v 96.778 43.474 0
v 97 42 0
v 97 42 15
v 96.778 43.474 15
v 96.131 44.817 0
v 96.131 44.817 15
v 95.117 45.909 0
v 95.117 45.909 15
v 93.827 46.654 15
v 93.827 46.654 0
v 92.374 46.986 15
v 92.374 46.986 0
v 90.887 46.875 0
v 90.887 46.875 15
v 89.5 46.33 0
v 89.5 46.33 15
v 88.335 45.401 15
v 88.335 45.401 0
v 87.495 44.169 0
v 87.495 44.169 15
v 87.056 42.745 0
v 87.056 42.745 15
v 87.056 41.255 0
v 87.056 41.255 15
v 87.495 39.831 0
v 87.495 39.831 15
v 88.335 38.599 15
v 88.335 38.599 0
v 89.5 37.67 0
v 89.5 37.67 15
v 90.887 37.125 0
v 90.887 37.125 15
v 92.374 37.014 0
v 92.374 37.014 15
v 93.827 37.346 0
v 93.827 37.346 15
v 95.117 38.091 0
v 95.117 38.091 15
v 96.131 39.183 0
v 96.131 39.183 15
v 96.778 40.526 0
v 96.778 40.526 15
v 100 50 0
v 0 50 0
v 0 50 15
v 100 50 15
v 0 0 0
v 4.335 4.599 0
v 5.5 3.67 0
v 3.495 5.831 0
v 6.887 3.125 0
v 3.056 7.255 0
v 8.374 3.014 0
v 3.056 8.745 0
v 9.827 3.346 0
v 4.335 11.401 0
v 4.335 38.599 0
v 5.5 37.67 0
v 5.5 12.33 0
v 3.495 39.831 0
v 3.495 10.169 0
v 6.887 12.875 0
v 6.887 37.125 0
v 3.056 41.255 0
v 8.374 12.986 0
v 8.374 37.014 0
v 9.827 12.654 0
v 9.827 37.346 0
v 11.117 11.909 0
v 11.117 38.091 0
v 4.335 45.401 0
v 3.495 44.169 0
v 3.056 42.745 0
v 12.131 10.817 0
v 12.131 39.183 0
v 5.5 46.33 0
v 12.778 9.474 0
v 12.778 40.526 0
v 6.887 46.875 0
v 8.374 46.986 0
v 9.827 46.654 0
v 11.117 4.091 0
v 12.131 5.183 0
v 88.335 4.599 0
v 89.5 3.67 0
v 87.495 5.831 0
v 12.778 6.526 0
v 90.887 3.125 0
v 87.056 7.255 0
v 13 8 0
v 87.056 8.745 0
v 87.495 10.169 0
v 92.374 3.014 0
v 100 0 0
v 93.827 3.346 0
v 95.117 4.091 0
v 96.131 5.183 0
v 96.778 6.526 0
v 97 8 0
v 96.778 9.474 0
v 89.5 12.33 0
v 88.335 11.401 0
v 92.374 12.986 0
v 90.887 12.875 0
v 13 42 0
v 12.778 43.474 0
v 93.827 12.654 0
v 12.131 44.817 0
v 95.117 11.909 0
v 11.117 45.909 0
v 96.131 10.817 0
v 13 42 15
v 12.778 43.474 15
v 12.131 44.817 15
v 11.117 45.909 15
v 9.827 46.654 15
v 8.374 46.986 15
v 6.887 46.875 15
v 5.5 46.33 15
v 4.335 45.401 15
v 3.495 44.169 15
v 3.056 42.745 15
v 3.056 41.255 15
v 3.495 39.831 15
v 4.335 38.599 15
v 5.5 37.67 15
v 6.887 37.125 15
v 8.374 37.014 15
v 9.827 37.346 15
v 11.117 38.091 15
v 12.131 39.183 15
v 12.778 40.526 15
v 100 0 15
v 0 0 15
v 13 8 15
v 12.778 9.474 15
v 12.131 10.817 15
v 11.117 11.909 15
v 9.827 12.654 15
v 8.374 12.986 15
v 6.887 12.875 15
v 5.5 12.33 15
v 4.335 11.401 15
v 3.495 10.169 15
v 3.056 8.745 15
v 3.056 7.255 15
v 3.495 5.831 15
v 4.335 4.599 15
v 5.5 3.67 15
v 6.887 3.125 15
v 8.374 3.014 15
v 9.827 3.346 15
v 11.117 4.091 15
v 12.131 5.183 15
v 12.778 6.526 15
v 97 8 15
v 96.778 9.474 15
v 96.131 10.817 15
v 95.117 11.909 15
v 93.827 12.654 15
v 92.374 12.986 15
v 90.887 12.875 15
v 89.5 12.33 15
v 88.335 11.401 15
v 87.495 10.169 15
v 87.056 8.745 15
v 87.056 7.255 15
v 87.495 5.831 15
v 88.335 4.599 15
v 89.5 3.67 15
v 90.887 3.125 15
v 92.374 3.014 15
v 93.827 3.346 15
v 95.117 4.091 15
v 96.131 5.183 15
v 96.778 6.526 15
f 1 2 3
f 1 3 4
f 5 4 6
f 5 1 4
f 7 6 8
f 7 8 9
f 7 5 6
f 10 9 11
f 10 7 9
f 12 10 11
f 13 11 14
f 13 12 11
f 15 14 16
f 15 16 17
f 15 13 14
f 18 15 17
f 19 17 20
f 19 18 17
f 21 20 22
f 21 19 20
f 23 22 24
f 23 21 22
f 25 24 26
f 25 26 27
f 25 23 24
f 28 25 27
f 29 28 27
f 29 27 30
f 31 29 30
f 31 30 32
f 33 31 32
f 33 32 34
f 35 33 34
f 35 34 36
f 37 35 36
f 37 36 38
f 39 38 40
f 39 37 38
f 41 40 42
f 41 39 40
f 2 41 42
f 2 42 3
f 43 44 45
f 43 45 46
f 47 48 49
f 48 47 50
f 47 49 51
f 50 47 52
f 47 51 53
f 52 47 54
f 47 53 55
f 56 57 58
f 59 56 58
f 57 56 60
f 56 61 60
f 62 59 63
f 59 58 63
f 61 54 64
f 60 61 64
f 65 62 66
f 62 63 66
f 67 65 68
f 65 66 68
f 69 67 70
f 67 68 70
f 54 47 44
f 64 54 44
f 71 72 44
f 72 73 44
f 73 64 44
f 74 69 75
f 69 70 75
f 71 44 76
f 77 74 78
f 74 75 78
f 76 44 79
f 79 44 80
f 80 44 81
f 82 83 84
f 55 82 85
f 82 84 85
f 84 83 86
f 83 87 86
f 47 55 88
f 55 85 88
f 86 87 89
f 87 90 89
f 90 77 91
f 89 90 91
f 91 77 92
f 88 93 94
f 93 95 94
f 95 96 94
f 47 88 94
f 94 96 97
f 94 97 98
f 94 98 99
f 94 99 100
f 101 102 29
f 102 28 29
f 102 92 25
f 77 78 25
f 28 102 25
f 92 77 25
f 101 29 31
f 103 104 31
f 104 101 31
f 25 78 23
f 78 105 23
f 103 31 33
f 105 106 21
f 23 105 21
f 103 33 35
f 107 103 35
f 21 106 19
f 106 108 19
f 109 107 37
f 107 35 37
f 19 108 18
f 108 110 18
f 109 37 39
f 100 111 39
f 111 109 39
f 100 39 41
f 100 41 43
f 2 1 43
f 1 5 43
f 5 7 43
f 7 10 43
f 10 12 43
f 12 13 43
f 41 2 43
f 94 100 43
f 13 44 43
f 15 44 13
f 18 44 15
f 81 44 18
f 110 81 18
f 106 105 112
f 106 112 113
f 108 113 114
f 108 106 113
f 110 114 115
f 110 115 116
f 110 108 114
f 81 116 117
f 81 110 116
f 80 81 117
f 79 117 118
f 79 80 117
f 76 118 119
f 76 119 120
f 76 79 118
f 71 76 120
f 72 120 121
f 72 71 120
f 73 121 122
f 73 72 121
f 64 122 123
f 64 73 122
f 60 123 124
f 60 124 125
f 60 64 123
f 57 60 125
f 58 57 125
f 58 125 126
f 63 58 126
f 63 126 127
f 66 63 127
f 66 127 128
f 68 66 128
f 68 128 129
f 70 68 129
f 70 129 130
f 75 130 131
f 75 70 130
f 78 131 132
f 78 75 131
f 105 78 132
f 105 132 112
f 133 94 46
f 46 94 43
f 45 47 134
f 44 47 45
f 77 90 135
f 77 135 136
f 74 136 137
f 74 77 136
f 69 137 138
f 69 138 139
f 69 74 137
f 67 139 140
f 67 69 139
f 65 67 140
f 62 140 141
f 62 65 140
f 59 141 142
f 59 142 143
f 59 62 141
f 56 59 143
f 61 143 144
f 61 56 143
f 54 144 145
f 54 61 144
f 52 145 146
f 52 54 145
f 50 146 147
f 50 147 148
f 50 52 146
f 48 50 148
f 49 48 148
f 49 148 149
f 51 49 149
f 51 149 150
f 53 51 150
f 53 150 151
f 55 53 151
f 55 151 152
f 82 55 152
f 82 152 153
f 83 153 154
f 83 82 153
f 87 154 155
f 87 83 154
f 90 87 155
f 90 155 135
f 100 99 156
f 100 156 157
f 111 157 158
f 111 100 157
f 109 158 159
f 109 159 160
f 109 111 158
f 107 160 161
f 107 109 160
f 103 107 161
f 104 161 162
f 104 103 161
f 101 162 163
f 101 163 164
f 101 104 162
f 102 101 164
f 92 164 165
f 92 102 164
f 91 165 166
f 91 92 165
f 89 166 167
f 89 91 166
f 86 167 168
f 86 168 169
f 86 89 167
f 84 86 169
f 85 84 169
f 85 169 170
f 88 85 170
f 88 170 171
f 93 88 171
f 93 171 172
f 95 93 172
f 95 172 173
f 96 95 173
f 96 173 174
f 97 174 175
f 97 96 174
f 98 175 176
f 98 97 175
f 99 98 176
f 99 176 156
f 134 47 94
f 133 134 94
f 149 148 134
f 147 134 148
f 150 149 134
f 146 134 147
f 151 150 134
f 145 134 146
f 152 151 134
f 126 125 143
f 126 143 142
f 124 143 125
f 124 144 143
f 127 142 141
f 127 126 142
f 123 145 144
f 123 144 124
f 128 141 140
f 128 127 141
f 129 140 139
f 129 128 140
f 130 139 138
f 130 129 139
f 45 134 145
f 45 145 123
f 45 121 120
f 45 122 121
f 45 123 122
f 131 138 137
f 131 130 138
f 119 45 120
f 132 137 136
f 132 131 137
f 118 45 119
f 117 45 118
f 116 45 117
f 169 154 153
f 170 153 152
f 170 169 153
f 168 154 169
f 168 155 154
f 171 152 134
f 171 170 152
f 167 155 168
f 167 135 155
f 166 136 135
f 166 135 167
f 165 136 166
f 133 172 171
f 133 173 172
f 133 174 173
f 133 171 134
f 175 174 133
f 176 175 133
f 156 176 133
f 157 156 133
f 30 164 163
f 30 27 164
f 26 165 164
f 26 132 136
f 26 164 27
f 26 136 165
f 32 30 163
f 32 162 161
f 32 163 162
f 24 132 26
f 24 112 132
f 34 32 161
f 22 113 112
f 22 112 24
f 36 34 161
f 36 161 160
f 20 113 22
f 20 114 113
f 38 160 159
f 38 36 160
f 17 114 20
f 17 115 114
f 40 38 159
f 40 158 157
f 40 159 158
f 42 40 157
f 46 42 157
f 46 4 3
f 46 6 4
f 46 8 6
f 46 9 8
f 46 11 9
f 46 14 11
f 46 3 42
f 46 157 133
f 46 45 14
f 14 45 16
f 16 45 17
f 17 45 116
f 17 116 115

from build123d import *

# Parameters (mm, degrees)
SKETCH001_W  = 100
SKETCH001_H  = 50
SKETCH001_R  = 5
PAD_DEPTH    = 15
PAD001_DEPTH = 15


with BuildPart() as part:
    # Sketch001 → Pad (new body)
    with BuildSketch(Plane.XY):
        with Locations((50, 25)):
            Rectangle(SKETCH001_W, SKETCH001_H)
        with Locations((92, 42)):
            Circle(SKETCH001_R, mode=Mode.SUBTRACT)
        with Locations((8, 42)):
            Circle(SKETCH001_R, mode=Mode.SUBTRACT)
        with Locations((92, 8)):
            Circle(SKETCH001_R, mode=Mode.SUBTRACT)
        with Locations((8, 8)):
            Circle(SKETCH001_R, mode=Mode.SUBTRACT)
    extrude(amount=PAD_DEPTH)

    # Sketch001 → Pad001 (join)
    with BuildSketch(Plane.XY):
        with Locations((50, 25)):
            Rectangle(SKETCH001_W, SKETCH001_H)
        with Locations((92, 42)):
            Circle(SKETCH001_R, mode=Mode.SUBTRACT)
        with Locations((8, 42)):
            Circle(SKETCH001_R, mode=Mode.SUBTRACT)
        with Locations((92, 8)):
            Circle(SKETCH001_R, mode=Mode.SUBTRACT)
        with Locations((8, 8)):
            Circle(SKETCH001_R, mode=Mode.SUBTRACT)
    extrude(amount=PAD001_DEPTH)


solid = part.part
